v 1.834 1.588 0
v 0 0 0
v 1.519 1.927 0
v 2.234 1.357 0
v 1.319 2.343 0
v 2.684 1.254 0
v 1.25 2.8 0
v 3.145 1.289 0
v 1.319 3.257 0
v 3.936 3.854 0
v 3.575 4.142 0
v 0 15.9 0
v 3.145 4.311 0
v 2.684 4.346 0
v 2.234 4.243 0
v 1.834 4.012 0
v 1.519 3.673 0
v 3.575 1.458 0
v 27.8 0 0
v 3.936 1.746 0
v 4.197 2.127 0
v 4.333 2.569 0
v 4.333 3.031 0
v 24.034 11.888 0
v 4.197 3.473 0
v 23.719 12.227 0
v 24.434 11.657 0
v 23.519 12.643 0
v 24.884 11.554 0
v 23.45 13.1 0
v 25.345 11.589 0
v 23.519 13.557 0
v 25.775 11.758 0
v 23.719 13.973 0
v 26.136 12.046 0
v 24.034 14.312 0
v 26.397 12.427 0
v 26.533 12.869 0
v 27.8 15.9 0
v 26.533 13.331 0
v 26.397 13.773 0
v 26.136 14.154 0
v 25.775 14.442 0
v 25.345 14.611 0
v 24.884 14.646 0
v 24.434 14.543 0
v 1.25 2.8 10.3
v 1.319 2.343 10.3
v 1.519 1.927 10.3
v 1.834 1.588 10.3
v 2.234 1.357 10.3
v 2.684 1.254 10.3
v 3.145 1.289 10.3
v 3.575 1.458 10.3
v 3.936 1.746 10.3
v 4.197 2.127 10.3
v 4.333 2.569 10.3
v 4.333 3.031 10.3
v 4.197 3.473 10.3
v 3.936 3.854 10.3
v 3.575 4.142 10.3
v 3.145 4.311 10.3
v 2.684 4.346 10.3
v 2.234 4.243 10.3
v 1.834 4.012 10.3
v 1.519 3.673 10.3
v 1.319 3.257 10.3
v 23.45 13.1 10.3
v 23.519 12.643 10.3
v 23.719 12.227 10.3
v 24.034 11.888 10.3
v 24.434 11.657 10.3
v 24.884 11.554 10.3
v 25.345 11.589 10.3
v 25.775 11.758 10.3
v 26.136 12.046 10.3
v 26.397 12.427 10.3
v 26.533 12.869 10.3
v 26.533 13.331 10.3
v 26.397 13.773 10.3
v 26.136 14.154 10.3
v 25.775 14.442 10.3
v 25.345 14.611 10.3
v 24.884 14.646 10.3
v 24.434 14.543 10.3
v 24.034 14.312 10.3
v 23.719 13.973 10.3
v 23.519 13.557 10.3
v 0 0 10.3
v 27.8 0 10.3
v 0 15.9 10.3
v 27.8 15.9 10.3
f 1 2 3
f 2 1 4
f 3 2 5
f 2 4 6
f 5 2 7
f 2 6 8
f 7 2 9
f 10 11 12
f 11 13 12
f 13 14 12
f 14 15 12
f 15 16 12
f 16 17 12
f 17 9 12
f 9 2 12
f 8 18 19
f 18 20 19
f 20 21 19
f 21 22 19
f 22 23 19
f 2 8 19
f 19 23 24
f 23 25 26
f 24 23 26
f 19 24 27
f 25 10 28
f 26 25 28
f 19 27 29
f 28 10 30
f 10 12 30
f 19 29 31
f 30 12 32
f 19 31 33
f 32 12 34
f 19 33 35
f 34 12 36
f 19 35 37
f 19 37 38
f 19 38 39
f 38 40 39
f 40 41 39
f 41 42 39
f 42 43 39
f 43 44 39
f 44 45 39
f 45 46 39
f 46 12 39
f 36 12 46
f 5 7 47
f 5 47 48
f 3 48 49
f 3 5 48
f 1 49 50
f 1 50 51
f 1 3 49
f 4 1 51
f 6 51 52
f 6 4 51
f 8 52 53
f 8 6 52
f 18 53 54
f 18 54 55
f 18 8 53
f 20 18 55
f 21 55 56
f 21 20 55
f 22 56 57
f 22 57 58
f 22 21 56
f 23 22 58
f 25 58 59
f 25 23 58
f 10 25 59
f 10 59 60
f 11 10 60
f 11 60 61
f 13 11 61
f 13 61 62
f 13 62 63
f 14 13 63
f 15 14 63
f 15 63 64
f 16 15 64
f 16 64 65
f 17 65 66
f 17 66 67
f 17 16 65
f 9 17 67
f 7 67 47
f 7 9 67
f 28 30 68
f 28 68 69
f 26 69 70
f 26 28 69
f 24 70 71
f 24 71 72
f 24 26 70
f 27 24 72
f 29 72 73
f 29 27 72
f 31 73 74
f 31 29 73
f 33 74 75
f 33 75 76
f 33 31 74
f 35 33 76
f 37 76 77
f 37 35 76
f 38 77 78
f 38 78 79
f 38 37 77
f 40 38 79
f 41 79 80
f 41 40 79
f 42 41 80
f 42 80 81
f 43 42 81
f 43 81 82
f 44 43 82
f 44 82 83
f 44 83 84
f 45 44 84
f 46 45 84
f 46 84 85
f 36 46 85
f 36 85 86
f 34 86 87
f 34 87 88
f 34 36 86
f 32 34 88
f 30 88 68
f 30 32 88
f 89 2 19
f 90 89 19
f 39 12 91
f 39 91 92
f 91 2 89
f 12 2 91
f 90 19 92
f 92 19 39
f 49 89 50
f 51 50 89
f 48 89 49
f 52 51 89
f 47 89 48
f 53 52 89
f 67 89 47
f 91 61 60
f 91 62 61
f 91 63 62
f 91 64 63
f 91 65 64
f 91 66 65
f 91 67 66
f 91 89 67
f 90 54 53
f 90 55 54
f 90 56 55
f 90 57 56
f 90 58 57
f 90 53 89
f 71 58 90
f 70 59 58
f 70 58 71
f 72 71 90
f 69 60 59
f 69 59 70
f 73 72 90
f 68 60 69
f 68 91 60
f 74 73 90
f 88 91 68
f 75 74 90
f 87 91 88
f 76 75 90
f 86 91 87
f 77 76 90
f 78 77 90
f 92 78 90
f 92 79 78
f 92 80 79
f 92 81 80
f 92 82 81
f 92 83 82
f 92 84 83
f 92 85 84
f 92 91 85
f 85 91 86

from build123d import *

# Parameters (mm, degrees)
SKETCH_2_W      = 27.8
SKETCH_2_H      = 15.9
SKETCH_2_R      = 1.55
EXTRUDE_1_DEPTH = 10.3


with BuildPart() as part:
    # ｽｹｯﾁ2 → ﾎﾞｽ - 押し出し1 (new body)
    with BuildSketch(Plane.XY):
        with Locations((13.9, 7.95)):
            Rectangle(SKETCH_2_W, SKETCH_2_H)
        with Locations(Location((2.8, 2.8, 0), (0, 0, 180))):
            Circle(SKETCH_2_R, mode=Mode.SUBTRACT)
        with Locations(Location((25, 13.1, 0), (0, 0, 180))):
            Circle(SKETCH_2_R, mode=Mode.SUBTRACT)
    extrude(amount=EXTRUDE_1_DEPTH)


solid = part.part
